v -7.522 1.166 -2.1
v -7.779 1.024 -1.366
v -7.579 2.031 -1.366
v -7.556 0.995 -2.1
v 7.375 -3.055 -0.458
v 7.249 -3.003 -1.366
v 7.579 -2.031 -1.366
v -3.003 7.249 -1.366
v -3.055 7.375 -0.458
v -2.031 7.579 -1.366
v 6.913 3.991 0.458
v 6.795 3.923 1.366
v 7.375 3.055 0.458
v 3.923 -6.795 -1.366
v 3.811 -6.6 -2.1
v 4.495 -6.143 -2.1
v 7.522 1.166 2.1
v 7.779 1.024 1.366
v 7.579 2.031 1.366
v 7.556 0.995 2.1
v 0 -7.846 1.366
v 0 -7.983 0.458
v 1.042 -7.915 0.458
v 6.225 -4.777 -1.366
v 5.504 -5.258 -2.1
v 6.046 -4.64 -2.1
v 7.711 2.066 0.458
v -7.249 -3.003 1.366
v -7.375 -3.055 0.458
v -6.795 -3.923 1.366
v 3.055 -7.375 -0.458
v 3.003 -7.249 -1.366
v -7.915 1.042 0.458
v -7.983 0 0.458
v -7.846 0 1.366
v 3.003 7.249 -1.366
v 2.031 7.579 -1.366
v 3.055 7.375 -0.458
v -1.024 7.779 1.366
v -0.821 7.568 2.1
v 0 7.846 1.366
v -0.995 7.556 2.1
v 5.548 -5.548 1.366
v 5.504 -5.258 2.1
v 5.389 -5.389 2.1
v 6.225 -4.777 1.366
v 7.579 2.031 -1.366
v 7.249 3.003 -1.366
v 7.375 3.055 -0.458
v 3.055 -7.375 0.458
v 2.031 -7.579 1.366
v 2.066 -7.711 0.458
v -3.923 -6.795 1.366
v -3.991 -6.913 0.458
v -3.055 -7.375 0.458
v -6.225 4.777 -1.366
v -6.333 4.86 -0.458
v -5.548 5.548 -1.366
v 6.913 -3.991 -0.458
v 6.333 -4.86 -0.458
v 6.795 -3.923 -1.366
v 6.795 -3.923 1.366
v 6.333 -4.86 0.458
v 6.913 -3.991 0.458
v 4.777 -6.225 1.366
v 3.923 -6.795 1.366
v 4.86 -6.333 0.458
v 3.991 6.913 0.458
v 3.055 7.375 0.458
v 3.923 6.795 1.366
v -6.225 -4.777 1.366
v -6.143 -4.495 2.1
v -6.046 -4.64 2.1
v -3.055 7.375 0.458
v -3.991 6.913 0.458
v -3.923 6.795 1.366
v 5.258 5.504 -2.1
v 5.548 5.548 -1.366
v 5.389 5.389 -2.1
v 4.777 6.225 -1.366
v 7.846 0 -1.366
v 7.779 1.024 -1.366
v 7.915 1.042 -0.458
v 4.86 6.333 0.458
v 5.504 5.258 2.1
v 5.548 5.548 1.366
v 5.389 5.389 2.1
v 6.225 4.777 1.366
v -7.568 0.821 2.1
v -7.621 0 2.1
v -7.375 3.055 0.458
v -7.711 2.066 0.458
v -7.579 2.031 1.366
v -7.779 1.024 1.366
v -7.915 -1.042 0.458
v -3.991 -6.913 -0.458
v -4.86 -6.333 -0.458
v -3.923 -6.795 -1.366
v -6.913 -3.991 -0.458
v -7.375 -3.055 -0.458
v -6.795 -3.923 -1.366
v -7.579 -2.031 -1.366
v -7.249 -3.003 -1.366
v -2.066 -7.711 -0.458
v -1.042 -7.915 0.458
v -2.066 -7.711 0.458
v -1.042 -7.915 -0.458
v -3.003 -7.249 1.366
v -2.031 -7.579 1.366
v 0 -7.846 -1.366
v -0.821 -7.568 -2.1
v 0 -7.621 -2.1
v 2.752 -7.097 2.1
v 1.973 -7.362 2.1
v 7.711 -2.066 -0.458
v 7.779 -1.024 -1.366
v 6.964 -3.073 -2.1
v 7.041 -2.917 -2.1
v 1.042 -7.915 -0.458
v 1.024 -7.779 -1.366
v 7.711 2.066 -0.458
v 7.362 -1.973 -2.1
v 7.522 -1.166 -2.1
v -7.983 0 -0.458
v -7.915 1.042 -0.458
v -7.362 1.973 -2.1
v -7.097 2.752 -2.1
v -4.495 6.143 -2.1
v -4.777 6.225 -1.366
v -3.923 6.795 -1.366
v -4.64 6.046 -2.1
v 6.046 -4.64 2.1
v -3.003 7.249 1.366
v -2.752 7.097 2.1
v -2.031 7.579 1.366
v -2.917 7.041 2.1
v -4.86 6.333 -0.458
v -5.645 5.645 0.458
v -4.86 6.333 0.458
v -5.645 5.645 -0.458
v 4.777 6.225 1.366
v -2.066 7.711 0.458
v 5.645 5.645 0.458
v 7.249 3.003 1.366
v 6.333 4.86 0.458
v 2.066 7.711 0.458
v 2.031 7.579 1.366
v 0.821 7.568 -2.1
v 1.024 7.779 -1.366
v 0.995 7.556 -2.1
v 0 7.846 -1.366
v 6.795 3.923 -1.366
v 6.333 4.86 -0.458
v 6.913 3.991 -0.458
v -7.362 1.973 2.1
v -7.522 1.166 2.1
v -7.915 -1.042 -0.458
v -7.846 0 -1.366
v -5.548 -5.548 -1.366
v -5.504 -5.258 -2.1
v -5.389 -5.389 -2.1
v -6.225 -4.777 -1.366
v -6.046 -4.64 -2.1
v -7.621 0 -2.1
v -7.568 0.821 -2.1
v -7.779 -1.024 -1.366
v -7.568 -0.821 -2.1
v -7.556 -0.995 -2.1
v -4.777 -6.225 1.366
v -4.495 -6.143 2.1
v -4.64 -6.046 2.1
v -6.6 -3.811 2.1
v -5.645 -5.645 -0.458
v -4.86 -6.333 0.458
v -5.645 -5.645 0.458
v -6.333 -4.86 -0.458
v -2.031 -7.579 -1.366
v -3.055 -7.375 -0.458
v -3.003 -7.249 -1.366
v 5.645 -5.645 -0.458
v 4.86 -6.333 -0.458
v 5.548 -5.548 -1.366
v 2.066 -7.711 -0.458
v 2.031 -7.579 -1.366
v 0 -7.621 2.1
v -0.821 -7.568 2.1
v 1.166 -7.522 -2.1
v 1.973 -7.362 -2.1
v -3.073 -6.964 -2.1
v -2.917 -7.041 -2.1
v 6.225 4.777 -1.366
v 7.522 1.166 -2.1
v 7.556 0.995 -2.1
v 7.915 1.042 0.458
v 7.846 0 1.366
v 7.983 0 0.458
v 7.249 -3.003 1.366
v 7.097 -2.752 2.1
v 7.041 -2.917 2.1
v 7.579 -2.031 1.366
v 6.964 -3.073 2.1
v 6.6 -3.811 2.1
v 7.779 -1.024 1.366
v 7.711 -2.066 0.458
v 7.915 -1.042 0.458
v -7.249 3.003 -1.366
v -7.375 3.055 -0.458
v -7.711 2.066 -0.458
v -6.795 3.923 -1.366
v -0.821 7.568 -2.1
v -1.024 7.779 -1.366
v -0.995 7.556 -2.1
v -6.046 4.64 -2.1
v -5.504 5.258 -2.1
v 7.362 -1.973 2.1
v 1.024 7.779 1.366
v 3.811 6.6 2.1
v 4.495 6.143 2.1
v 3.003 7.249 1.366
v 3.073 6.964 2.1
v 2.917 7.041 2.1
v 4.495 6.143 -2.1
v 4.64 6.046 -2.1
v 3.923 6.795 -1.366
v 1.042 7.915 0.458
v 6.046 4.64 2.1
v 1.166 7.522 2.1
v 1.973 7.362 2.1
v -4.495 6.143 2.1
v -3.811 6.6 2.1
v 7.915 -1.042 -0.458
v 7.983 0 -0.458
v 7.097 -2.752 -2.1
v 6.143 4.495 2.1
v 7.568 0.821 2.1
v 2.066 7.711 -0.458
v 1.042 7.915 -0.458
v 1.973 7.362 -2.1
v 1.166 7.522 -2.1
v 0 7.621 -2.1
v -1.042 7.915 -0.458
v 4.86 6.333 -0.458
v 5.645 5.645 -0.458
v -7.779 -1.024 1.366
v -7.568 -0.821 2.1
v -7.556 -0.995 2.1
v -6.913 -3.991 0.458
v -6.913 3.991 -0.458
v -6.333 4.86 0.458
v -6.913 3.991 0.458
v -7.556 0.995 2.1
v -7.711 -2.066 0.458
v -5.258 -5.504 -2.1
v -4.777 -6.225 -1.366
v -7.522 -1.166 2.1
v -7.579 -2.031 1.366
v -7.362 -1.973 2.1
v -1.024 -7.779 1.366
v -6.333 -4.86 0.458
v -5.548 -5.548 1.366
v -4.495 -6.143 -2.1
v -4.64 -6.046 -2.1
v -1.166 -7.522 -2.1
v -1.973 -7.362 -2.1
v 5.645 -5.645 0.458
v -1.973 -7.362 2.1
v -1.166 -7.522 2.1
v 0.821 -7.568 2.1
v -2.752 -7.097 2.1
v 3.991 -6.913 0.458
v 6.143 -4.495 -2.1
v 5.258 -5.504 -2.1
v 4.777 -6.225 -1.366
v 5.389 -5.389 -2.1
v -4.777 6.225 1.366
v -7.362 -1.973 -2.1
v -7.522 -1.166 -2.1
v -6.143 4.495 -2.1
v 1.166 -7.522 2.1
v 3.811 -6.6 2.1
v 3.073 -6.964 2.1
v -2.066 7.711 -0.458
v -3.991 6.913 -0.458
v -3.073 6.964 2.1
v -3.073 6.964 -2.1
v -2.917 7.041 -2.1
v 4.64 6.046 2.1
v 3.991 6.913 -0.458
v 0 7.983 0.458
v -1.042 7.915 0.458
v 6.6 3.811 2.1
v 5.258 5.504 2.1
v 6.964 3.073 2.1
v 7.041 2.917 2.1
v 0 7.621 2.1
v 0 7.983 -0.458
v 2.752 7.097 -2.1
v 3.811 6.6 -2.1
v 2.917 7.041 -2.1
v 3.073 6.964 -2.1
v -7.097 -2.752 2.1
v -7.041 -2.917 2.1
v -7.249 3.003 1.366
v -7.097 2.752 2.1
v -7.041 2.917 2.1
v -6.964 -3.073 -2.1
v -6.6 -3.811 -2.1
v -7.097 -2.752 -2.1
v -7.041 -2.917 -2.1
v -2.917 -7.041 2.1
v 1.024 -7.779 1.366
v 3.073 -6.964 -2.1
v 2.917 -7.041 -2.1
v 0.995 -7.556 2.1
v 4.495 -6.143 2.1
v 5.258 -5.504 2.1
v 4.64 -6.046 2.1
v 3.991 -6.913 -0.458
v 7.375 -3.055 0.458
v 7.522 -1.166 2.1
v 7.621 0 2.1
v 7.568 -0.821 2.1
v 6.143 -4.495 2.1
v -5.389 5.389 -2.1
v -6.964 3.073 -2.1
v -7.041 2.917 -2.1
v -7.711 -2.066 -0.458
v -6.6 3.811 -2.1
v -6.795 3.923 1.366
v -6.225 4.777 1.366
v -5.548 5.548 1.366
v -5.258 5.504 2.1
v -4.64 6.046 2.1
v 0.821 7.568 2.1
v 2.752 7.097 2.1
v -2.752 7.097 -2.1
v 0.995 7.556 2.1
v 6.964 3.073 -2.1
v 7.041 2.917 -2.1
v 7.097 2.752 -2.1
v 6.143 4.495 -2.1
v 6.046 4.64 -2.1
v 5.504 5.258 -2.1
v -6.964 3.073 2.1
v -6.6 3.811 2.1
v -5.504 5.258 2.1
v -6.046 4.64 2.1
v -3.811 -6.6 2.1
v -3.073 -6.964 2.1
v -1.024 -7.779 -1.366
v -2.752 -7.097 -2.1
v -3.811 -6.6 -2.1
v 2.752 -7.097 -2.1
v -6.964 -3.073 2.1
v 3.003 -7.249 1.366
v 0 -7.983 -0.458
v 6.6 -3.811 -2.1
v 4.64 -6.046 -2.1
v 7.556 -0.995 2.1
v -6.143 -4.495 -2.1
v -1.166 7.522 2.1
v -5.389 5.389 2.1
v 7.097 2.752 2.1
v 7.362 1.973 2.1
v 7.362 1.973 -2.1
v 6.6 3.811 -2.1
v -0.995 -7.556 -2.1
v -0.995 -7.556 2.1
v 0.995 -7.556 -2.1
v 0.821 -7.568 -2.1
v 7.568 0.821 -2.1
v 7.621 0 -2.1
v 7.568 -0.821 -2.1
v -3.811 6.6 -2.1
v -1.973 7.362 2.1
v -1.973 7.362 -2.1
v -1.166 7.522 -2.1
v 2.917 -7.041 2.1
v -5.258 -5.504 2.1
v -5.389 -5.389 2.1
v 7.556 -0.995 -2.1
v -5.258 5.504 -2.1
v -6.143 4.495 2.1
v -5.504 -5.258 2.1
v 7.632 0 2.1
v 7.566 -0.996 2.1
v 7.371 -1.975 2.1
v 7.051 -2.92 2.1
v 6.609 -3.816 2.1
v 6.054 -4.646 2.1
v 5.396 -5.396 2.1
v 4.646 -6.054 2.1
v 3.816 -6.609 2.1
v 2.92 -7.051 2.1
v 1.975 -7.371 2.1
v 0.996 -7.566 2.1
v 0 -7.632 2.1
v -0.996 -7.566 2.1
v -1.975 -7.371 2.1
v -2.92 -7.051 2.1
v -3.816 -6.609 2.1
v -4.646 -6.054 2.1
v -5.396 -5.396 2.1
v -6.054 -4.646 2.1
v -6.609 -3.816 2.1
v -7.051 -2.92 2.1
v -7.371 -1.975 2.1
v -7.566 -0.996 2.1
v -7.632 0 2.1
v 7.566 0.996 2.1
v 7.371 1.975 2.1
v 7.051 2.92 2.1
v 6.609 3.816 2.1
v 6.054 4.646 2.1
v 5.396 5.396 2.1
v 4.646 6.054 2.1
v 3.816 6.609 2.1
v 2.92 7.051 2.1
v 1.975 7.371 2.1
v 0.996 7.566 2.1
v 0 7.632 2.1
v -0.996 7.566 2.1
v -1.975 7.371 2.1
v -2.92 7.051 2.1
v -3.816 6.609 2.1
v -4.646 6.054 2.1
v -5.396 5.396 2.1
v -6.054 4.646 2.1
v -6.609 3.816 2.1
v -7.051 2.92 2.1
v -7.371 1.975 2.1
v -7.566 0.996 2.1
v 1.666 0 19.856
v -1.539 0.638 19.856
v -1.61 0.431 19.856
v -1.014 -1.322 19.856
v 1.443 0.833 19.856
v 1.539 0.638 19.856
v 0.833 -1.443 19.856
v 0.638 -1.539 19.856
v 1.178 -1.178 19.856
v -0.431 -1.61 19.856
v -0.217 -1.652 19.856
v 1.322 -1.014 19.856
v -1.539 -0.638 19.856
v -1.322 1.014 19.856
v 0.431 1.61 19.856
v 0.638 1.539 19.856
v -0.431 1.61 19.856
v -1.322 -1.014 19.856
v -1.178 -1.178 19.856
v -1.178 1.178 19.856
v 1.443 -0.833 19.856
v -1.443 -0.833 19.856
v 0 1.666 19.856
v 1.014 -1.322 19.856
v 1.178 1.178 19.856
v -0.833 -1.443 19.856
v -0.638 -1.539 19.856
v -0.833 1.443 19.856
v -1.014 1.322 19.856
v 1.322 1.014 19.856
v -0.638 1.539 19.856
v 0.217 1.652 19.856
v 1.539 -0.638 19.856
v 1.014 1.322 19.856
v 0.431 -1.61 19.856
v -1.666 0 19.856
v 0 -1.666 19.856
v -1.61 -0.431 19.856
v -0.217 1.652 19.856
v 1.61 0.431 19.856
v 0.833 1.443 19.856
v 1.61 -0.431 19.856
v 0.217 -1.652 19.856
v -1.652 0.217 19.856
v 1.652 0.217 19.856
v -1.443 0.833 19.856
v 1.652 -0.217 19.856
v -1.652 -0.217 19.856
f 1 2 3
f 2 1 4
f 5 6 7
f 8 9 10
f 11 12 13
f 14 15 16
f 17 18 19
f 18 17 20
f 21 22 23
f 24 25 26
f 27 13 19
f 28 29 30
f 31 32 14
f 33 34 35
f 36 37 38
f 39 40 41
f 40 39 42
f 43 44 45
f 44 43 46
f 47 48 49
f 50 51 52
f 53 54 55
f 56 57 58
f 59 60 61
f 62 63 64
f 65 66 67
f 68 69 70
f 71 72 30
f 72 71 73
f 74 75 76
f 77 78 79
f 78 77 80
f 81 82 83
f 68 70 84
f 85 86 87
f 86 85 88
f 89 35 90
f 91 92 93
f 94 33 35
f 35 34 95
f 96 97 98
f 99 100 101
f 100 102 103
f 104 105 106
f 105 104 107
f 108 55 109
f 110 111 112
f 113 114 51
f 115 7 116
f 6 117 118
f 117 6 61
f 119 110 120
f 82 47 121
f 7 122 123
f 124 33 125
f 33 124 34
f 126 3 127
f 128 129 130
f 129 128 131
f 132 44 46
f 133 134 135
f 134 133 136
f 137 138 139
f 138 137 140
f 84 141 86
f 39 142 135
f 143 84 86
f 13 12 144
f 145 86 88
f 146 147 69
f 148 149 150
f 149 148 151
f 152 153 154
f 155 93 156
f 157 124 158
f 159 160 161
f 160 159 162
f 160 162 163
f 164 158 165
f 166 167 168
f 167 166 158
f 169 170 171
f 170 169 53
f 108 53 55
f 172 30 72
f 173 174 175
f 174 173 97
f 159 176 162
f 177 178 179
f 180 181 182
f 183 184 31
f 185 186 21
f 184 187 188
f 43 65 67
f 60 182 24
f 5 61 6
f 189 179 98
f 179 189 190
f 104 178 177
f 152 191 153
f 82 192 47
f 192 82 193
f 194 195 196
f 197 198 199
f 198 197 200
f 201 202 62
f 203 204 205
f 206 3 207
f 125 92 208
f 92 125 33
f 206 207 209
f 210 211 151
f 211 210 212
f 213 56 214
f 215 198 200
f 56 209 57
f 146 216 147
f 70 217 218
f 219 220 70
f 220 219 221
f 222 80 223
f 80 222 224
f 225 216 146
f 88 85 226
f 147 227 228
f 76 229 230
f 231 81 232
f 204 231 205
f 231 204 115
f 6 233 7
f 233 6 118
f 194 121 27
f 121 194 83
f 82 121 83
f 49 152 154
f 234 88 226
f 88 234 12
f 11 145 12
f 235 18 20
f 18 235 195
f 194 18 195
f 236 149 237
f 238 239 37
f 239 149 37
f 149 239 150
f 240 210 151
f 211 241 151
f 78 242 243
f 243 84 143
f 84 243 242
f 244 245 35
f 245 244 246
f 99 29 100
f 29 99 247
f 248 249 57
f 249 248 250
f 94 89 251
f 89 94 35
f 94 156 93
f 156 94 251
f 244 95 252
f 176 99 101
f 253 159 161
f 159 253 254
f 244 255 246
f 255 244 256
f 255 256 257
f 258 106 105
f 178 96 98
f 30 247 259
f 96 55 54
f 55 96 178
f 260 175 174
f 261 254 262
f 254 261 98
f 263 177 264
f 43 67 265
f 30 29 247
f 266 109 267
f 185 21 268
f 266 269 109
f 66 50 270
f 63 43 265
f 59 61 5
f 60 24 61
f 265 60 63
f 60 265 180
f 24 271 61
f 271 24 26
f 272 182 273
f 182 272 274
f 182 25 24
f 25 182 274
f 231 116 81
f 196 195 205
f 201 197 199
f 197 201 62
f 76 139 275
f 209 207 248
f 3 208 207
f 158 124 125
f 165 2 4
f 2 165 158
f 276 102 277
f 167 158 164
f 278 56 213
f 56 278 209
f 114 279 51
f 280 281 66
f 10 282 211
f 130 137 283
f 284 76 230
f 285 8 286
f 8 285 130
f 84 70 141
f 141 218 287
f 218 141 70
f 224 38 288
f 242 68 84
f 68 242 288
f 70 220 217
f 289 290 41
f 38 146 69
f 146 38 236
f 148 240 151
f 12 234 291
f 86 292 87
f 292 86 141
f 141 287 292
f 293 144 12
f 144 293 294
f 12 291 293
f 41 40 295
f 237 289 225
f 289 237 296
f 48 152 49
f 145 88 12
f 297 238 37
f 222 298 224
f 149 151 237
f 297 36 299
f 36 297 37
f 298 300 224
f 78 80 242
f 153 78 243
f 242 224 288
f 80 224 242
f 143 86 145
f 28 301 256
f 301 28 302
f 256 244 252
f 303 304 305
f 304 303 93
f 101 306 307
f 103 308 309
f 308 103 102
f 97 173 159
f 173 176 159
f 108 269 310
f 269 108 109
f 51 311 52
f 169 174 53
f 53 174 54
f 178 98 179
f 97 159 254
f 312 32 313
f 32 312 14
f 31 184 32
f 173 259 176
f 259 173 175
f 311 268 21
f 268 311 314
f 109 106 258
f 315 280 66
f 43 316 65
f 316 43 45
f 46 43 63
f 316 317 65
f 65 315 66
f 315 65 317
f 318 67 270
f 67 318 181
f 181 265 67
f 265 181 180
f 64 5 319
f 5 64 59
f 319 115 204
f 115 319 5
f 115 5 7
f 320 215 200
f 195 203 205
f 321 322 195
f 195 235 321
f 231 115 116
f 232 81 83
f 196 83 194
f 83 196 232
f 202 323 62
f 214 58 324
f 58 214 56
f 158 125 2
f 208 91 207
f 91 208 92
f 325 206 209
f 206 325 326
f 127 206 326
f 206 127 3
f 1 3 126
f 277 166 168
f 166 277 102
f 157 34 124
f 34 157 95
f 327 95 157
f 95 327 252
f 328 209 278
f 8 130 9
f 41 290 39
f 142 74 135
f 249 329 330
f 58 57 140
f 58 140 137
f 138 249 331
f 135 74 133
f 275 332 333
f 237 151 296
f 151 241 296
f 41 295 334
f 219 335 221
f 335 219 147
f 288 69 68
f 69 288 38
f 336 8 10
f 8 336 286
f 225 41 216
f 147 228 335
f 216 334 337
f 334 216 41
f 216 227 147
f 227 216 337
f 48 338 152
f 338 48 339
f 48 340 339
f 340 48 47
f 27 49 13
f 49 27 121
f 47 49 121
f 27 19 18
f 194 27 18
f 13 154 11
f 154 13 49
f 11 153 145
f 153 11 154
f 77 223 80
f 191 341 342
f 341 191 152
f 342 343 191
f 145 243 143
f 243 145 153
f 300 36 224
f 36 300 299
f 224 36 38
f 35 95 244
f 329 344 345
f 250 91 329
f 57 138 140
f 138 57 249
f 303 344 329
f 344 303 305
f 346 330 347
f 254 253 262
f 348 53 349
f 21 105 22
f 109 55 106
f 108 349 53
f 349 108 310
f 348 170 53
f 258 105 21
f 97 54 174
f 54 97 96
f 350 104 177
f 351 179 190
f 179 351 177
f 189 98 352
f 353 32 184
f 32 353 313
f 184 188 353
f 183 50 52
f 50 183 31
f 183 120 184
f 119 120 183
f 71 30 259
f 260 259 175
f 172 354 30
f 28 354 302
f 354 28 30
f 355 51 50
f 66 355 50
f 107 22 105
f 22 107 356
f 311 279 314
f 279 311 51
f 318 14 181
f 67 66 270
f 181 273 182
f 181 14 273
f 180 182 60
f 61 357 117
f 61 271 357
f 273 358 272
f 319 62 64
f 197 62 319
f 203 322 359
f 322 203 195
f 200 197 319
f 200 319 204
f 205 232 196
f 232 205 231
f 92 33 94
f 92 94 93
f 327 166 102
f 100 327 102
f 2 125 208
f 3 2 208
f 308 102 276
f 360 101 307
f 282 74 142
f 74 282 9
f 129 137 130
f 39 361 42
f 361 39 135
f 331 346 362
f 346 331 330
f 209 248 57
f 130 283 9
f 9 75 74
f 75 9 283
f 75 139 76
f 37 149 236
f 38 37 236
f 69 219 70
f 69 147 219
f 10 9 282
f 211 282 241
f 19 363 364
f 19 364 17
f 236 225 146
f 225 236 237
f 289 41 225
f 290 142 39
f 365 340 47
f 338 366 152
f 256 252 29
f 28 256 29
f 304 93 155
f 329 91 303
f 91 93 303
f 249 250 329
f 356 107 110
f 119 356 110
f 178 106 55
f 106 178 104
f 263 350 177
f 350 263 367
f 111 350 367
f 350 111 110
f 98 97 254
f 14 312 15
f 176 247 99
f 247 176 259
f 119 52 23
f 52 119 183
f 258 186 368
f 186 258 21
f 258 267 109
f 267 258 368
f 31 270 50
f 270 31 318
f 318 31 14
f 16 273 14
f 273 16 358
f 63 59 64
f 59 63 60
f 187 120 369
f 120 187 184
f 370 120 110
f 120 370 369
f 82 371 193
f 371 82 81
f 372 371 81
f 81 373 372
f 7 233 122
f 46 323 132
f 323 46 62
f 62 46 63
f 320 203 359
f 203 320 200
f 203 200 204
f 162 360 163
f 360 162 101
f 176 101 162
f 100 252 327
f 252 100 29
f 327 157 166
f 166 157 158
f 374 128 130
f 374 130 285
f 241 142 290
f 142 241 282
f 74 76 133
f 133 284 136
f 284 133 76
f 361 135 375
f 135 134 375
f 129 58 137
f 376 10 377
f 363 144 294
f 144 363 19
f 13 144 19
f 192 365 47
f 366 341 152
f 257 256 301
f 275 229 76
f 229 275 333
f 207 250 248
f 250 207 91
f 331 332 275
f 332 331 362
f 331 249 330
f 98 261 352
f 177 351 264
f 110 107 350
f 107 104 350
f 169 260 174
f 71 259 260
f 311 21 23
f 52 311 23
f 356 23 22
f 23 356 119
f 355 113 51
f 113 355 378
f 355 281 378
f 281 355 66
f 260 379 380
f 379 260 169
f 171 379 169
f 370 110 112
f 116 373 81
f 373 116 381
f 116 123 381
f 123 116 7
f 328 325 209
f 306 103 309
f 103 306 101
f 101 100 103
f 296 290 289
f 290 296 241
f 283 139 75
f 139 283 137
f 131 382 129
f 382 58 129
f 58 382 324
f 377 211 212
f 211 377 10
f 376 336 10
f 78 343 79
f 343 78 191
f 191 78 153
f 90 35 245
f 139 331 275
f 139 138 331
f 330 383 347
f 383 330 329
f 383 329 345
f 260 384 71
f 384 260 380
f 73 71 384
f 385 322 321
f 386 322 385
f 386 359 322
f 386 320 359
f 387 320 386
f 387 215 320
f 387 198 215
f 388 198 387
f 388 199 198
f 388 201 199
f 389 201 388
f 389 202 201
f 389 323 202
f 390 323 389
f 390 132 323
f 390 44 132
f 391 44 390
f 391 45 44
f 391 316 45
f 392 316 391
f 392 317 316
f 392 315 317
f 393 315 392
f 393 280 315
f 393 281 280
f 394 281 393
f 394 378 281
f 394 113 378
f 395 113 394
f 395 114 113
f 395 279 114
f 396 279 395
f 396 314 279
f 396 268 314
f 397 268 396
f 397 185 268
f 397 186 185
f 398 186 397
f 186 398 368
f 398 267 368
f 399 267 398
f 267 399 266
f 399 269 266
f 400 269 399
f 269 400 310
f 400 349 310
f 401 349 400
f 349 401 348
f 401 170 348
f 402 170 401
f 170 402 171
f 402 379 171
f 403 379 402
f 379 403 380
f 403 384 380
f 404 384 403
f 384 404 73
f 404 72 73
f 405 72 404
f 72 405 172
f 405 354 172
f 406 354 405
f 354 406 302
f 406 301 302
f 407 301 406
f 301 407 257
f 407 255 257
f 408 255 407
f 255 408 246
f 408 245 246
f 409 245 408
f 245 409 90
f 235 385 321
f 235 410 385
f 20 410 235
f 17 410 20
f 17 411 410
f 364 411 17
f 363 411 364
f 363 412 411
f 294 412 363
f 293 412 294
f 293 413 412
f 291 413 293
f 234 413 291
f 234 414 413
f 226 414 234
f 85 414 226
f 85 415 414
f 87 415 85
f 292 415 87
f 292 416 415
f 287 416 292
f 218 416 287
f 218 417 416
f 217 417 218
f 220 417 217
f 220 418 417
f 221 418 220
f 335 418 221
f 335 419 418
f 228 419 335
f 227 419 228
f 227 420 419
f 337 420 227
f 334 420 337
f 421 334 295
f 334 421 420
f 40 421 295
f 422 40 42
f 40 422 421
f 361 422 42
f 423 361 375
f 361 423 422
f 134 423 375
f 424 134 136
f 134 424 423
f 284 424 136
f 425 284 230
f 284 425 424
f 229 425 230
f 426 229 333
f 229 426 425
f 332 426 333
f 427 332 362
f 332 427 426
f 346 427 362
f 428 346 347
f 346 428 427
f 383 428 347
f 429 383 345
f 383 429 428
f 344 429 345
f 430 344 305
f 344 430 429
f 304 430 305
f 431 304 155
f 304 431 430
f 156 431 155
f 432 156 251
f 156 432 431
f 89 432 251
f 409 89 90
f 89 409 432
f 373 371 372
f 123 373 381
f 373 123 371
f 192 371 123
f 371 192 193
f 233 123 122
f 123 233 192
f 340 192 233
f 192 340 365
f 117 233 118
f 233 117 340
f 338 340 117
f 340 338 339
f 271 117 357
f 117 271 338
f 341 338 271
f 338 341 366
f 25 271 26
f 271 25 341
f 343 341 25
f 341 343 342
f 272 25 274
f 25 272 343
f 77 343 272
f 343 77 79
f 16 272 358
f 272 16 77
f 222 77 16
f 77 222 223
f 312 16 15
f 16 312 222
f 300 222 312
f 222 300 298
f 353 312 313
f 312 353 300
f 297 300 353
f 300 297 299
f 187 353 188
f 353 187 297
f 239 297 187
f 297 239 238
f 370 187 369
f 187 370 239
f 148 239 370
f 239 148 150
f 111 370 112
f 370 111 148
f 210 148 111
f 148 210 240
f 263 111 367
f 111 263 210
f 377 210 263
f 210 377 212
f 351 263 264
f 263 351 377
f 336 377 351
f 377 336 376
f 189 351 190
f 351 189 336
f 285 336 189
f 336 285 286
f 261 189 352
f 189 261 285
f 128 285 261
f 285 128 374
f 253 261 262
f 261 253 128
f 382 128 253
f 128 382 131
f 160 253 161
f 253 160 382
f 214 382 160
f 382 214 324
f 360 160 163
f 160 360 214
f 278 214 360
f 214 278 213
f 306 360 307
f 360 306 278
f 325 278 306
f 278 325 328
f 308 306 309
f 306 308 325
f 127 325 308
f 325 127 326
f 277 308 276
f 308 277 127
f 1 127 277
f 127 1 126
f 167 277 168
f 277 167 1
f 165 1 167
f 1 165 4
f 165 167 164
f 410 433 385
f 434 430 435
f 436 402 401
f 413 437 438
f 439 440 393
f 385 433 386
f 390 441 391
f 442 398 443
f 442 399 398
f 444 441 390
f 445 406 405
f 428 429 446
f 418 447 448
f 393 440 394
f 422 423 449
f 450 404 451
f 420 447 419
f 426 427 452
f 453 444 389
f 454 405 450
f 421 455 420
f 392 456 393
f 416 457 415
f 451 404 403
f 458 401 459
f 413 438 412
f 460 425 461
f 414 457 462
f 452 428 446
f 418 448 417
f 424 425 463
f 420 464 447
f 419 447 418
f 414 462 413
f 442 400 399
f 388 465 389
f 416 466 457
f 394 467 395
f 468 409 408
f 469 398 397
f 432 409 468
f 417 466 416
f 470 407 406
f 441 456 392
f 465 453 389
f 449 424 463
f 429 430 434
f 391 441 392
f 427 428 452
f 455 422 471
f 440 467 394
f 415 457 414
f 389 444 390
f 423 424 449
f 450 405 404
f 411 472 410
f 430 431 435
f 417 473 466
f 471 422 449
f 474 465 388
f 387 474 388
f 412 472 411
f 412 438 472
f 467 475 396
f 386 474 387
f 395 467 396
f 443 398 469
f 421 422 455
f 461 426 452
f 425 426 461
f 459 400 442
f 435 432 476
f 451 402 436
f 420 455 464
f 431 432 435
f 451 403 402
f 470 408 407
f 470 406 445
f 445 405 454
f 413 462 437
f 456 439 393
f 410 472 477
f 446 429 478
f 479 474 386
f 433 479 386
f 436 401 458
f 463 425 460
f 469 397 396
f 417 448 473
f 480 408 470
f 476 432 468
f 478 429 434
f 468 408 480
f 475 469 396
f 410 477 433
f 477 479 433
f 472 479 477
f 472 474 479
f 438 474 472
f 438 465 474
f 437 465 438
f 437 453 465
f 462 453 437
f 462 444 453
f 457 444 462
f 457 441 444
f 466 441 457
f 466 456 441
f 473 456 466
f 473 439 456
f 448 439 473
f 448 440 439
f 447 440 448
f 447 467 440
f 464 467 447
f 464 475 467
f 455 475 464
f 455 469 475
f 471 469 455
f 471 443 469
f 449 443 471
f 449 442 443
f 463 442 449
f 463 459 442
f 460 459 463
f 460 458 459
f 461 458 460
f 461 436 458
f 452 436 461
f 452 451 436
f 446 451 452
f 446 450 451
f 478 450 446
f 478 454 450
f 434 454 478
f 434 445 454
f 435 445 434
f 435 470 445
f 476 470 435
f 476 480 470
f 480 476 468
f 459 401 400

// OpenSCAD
// [FL_INDEX: keywords="openscad, 3d_parametric, Nozzle_for_flex_hose, csg_solid" | COT="Parametric OpenSCAD design from 3DCodeverse"]
// Title: Nozzle for flex hose

// Print with no infill and wall thickness t

//Resolution
$fn=48;

//Radius of joint sphere
r=7;

// Wall thickness. Don't forget to adjust slicer!
t=1;

// Height of top sphere, affects max bending angle and inner diameter of tube
h = 0.7;

// Height of bottom sphere segment. Determines how difficult it is to join parts.
d= 0.3; 

// Determines slope of neck. Decrease to make tube segment longer. Should not be lower than d.
neck = 0.3;

tube(r,t,h,neck,d);

module tube(r,t,u,l1,l2)
{
  trunc_r = r*sqrt(1-u*u); // Radius of truncated circle on top sphere
  cone_h = (r+t)/l1 - (r+t)*l1; // height of cone
  cone_r = (r+t)*sqrt(1-l1*l1); // base radius
  cone_factor = trunc_r/cone_r; // Truncate cone
  zscale = r/(r+t); // Squash bottom sphere to make inside more spherical
  p = ((r+t)*l1+cone_h*(1-cone_factor))*zscale+r*u;

  union() {
    scale([1,1,zscale]) {
      truncSphere(r+t,l2,l1);
      translate([0,0,(r+t)*l1])cylinder(r1=cone_r,r2=cone_r*(cone_factor/3),h=cone_h*(1-cone_factor/4));
    }
    //translate([0,0,p])truncSphere(r,u,u);
  }
}

module truncSphere(r,h1,h2) {
  intersection() {
    sphere(r);
    translate(-r*[1,1,h1])cube(r*[2,2,h1+h2]);
  }
}
